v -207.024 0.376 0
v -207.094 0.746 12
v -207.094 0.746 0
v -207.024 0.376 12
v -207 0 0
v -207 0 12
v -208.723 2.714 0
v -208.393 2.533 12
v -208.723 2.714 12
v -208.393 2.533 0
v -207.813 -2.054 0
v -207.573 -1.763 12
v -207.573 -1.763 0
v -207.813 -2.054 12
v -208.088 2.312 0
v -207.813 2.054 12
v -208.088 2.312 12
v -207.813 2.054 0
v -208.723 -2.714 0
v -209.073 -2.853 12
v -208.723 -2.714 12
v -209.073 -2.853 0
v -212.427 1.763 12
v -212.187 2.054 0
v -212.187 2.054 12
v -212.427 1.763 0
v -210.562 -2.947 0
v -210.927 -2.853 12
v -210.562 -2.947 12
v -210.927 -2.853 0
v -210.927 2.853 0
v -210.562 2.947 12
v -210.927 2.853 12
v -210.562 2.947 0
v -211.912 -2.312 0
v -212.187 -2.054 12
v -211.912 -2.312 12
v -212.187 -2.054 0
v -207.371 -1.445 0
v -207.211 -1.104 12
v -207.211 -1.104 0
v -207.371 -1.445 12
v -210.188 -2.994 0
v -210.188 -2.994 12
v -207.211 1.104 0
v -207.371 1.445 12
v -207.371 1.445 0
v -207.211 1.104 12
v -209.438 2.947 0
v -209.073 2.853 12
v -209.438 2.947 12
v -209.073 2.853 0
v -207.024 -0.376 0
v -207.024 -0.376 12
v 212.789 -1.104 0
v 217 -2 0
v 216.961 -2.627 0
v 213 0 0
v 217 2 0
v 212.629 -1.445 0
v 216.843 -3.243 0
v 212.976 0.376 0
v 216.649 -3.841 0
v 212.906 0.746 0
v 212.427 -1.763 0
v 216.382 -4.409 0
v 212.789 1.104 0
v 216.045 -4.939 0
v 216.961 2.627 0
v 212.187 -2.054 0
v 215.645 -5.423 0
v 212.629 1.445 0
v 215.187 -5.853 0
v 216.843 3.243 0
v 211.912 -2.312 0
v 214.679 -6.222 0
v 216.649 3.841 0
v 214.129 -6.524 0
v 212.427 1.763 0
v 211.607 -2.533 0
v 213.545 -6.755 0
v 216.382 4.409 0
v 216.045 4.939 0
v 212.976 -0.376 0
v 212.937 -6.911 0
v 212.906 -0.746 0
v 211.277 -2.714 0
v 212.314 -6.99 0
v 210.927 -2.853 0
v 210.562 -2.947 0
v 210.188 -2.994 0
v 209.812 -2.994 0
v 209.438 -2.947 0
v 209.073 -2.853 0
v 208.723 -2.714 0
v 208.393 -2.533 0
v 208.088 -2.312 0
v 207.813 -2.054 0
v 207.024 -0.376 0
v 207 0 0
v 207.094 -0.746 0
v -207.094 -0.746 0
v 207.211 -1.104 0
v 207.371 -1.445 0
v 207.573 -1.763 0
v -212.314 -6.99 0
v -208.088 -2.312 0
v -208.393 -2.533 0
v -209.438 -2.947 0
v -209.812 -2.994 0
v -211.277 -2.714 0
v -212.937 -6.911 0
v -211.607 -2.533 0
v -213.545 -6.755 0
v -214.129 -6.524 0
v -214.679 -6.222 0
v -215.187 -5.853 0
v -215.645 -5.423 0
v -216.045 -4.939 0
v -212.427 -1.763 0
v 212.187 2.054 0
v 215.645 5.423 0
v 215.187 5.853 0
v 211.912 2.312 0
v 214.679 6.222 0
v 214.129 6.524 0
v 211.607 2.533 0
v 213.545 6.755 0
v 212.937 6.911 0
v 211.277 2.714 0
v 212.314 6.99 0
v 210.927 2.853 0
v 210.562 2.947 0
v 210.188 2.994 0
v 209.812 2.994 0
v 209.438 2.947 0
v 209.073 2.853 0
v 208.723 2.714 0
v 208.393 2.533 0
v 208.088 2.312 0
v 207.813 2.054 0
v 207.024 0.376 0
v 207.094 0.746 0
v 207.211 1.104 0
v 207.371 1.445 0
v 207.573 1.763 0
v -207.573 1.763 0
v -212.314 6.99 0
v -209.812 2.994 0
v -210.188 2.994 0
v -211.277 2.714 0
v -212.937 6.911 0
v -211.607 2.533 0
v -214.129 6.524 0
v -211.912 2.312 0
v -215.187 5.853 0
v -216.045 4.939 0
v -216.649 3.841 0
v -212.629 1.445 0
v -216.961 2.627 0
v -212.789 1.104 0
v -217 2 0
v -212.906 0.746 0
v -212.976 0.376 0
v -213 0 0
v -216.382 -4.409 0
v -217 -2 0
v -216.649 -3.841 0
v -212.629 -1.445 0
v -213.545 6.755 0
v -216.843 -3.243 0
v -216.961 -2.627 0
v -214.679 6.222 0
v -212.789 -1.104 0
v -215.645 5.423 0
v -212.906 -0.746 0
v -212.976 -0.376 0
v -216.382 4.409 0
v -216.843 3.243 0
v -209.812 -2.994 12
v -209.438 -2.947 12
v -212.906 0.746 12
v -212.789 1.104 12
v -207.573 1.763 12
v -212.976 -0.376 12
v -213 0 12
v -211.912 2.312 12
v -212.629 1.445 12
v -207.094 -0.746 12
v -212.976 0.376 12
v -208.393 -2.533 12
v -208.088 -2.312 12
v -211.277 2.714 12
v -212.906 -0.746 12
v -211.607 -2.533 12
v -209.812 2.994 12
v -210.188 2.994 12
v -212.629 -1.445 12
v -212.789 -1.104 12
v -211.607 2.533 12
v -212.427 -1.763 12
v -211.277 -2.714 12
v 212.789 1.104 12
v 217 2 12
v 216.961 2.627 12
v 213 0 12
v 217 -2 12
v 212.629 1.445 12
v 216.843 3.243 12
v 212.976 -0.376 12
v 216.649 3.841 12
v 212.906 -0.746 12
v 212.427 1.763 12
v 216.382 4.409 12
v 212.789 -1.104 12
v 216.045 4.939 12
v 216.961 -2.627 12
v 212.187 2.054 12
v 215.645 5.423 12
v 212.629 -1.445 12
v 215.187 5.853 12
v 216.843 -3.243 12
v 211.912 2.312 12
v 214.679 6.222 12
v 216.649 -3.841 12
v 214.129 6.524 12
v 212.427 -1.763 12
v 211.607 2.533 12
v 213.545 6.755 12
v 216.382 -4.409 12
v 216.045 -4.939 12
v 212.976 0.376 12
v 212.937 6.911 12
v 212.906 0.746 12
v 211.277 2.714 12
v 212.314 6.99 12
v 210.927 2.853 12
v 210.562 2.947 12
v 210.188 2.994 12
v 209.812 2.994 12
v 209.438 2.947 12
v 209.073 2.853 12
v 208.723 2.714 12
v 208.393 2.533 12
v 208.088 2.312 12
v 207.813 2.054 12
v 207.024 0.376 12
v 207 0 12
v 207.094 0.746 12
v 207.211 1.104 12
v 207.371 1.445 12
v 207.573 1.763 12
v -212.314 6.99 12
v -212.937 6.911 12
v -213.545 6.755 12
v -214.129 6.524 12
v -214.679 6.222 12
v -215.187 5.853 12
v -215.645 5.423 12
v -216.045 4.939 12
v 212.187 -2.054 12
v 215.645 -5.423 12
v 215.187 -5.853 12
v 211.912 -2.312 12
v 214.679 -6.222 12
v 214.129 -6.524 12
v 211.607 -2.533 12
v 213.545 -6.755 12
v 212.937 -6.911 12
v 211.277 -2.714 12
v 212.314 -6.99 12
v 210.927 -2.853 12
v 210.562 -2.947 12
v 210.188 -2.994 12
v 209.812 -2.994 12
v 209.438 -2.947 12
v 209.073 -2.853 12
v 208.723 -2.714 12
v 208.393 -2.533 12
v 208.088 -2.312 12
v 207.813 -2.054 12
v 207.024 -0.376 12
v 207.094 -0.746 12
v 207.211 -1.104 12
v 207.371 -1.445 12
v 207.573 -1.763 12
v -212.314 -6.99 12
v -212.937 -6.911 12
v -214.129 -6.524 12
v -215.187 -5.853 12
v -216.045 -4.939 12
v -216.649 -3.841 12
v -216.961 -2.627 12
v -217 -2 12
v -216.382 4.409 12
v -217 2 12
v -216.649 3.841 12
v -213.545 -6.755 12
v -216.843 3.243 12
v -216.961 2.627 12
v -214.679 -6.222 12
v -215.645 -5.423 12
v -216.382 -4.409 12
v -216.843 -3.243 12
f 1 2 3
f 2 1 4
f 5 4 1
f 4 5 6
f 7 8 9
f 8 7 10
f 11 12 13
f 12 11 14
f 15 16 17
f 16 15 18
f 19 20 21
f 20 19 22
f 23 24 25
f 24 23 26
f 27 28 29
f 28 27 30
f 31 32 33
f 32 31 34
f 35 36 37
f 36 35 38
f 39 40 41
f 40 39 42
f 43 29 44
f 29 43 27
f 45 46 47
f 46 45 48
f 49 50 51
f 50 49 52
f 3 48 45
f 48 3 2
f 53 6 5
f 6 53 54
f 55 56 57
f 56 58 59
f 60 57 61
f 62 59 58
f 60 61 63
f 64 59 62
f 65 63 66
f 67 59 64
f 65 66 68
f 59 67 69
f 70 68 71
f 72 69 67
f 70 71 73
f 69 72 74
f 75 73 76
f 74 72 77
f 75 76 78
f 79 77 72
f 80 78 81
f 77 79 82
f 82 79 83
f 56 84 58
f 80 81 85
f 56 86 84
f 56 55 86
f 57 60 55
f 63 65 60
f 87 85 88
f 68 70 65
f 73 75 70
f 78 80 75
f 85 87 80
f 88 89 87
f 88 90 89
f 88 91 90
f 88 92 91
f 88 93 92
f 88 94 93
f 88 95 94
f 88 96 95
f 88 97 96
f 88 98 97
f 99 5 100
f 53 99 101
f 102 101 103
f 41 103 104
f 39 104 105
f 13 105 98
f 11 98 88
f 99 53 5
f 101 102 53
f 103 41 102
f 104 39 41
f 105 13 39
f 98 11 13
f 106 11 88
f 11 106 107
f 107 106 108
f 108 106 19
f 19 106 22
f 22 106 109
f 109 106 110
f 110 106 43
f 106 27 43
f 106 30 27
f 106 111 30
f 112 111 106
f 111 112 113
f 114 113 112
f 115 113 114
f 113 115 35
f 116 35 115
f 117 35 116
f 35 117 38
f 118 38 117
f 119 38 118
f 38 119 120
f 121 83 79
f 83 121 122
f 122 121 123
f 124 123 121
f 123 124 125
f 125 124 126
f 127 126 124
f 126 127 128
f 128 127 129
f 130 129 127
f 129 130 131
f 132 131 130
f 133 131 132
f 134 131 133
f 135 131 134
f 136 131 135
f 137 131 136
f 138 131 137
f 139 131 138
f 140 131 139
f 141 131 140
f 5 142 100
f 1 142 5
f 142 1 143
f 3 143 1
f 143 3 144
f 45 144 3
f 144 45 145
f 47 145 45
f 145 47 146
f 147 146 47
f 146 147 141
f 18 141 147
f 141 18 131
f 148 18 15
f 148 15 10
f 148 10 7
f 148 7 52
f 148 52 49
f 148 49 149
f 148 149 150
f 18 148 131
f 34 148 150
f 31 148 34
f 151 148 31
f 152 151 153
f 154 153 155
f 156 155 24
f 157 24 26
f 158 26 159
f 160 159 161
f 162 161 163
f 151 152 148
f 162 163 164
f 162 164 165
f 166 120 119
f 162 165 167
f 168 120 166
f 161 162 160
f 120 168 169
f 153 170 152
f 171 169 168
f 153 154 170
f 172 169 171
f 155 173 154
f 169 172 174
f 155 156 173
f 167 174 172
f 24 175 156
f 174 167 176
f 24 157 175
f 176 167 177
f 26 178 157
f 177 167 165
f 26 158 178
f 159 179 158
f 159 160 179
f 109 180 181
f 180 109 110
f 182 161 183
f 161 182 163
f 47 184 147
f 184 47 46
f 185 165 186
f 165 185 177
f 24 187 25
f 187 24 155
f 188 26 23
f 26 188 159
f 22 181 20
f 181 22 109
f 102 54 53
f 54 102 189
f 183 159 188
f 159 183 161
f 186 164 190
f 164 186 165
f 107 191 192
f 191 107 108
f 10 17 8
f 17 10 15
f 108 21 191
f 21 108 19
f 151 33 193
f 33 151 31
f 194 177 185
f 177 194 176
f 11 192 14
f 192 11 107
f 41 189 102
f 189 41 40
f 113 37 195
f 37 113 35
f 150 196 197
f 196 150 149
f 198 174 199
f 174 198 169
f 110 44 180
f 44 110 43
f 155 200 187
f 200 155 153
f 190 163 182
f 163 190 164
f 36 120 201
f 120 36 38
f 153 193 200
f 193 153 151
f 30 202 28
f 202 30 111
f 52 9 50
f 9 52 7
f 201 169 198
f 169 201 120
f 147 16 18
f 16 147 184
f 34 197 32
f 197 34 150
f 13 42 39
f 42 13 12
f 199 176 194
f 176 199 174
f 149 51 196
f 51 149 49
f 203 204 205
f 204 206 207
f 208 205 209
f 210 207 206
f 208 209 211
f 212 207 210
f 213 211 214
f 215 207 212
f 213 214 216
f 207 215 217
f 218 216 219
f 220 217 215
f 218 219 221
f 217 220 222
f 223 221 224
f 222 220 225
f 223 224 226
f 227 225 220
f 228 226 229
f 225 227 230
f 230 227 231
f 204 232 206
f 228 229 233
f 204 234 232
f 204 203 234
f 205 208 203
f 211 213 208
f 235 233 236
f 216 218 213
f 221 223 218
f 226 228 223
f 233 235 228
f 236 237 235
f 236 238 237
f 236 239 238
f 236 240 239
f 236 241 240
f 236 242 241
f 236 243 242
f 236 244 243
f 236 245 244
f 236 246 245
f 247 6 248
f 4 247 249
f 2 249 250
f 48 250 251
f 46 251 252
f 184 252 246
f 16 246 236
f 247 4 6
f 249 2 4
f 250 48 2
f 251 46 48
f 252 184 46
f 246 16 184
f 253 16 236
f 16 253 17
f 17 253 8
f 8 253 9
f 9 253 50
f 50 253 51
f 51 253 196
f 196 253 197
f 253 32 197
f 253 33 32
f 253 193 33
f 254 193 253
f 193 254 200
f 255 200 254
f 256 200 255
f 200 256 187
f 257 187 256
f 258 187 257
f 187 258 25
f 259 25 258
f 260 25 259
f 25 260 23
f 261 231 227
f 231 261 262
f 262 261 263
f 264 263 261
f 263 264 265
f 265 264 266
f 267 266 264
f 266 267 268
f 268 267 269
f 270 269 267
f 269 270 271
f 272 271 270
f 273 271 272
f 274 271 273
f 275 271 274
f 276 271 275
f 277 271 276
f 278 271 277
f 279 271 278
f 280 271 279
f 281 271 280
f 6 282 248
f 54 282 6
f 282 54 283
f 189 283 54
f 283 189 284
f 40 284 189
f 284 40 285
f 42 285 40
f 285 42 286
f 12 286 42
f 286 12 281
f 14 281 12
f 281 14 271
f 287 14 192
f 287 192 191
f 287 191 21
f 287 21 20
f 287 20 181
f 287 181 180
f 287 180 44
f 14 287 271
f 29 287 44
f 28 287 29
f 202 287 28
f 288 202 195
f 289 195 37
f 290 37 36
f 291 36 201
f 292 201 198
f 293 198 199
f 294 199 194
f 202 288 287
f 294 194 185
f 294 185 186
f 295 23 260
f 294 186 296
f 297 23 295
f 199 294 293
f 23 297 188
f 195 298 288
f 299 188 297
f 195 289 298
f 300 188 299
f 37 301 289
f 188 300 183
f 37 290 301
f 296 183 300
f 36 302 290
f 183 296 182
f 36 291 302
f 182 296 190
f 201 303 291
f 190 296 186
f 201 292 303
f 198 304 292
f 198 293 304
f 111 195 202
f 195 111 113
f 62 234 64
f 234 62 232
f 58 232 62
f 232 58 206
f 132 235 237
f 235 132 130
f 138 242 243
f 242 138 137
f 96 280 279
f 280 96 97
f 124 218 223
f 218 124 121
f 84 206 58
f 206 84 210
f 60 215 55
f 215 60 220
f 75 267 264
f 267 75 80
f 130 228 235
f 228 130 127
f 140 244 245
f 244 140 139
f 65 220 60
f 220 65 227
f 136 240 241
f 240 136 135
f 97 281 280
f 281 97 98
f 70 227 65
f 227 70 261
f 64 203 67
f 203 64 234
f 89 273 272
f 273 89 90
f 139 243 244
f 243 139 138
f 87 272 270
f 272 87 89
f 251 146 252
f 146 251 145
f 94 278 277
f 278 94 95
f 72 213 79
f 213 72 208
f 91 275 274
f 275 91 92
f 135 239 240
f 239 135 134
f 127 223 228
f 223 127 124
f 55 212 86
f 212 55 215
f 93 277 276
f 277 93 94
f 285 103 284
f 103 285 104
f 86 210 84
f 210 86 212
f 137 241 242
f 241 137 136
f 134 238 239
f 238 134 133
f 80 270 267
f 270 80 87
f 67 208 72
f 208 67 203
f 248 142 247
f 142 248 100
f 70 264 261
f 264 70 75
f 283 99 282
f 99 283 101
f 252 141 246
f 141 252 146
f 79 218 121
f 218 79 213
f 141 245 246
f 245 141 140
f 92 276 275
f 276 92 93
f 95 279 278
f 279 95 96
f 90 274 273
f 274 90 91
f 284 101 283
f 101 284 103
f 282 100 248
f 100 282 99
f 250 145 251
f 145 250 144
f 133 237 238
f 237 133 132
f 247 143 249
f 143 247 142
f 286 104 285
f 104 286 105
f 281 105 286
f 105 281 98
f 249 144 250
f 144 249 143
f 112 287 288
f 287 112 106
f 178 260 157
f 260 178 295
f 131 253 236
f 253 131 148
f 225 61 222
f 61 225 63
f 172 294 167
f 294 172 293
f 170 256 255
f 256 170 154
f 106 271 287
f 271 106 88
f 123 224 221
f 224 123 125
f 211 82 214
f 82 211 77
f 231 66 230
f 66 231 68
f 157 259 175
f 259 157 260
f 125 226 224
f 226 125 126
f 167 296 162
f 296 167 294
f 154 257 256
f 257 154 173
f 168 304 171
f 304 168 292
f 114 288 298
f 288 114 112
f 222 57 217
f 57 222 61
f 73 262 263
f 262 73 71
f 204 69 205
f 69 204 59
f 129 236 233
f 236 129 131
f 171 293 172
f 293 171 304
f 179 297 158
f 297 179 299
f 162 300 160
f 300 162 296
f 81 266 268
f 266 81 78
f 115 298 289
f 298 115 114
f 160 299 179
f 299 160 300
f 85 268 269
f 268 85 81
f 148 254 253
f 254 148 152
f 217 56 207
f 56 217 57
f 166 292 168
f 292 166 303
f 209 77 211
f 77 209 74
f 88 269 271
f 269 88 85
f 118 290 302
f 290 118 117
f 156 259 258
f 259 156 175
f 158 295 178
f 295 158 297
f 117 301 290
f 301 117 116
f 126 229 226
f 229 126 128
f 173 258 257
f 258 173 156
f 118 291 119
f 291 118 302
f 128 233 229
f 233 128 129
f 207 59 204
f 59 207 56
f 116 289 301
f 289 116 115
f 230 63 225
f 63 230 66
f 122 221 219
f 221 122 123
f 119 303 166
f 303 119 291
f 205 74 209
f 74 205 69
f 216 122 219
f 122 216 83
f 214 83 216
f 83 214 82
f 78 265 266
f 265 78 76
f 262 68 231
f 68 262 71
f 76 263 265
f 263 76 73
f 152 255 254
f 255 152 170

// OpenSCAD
$fn = 50;


difference() {
	union() {
		hull() {
			translate(v = [-212.0000000000, 2.0000000000, 0]) {
				cylinder(h = 12, r = 5);
			}
			translate(v = [212.0000000000, 2.0000000000, 0]) {
				cylinder(h = 12, r = 5);
			}
			translate(v = [-212.0000000000, -2.0000000000, 0]) {
				cylinder(h = 12, r = 5);
			}
			translate(v = [212.0000000000, -2.0000000000, 0]) {
				cylinder(h = 12, r = 5);
			}
		}
	}
	union() {
		translate(v = [-210.0000000000, 0.0000000000, 0]) {
			cylinder(h = 12, r = 3.0000000000);
		}
		translate(v = [210.0000000000, 0.0000000000, 0]) {
			cylinder(h = 12, r = 3.0000000000);
		}
		translate(v = [-210.0000000000, 0.0000000000, 0]) {
			cylinder(h = 12, r = 1.5000000000);
		}
		translate(v = [210.0000000000, 0.0000000000, 0]) {
			cylinder(h = 12, r = 1.5000000000);
		}
		translate(v = [-210.0000000000, 0.0000000000, 0]) {
			cylinder(h = 12, r = 1.5000000000);
		}
		translate(v = [210.0000000000, 0.0000000000, 0]) {
			cylinder(h = 12, r = 1.5000000000);
		}
		translate(v = [-210.0000000000, 0.0000000000, 0]) {
			cylinder(h = 12, r = 1.5000000000);
		}
		translate(v = [210.0000000000, 0.0000000000, 0]) {
			cylinder(h = 12, r = 1.5000000000);
		}
	}
}
